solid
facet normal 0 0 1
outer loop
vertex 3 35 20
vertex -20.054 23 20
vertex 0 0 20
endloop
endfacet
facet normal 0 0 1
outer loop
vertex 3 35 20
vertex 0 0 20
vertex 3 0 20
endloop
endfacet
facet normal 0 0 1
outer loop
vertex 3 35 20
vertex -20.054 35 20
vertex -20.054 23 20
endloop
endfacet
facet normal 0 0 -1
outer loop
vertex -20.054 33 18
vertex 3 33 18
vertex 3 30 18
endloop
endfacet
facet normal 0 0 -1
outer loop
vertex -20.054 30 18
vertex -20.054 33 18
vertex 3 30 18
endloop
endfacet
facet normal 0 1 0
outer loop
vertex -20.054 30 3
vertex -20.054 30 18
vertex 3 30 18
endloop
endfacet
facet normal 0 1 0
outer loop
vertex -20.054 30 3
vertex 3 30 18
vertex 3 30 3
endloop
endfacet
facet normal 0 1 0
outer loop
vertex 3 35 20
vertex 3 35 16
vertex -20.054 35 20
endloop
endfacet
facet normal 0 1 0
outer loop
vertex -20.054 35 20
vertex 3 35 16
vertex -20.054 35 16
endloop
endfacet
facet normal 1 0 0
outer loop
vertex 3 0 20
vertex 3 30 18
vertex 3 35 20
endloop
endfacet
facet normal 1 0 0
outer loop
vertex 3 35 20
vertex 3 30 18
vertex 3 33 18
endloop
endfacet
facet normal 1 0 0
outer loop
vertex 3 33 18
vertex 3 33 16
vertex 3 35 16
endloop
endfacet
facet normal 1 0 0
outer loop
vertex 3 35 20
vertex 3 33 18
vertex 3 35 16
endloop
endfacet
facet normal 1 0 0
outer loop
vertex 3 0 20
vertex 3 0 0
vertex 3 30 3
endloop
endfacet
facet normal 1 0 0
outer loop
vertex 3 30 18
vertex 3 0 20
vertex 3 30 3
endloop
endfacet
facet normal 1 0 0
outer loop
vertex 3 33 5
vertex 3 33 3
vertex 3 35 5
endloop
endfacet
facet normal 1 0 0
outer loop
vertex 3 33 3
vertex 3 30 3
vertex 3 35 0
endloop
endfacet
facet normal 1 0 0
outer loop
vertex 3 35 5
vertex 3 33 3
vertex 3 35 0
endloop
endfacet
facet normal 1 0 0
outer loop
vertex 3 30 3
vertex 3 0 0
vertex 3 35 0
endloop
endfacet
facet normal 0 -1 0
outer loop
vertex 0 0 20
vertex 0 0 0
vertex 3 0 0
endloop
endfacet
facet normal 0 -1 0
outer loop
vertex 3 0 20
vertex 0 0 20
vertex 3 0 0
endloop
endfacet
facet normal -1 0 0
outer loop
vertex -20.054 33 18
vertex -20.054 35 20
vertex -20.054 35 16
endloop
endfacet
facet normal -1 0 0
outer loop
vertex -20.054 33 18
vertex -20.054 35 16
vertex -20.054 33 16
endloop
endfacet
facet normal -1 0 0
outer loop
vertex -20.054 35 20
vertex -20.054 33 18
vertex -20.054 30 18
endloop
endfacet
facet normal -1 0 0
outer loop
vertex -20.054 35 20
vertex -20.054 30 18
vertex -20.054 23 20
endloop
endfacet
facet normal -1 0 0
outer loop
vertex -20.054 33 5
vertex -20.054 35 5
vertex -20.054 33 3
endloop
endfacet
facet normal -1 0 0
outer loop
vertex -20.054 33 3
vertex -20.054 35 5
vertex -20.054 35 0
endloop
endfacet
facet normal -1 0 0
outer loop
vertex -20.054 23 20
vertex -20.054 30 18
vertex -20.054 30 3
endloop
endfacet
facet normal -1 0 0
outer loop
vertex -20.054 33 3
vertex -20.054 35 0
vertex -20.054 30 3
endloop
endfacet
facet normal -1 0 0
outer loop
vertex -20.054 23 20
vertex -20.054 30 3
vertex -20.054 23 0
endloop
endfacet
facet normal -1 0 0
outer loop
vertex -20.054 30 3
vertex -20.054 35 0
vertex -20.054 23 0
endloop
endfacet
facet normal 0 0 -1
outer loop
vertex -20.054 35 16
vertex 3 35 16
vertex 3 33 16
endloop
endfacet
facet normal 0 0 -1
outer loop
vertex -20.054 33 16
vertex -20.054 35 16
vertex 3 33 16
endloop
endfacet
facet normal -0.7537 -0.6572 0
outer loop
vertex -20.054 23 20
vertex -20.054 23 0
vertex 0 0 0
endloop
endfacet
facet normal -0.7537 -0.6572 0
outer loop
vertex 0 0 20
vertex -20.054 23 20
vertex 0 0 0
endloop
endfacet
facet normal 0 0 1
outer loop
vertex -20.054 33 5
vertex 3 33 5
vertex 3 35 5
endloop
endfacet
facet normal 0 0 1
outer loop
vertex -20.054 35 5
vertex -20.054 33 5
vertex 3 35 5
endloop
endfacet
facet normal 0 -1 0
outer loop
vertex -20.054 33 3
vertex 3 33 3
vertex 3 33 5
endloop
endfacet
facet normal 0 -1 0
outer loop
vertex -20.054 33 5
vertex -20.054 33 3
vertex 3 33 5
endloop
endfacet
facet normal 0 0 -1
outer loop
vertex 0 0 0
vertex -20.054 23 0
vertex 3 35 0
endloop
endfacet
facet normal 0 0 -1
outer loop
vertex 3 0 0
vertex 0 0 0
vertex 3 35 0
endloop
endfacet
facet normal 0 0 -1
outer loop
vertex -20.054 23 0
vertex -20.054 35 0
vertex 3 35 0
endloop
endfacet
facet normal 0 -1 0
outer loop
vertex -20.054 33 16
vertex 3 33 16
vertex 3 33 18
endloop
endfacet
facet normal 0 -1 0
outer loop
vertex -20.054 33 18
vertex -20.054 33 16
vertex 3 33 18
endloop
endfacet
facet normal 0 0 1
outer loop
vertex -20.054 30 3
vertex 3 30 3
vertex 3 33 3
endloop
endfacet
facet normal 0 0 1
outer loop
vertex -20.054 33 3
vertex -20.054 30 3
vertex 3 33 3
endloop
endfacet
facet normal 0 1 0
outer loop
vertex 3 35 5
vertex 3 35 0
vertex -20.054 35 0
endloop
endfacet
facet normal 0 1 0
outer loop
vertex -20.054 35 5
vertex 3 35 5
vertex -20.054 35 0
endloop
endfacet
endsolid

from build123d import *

# Parameters (mm, degrees)
BOSS_EXTRUDE1_DEPTH = 20
CUT_EXTRUDE1_DEPTH  = 24.053894737


with BuildPart() as part:
    # Sketch1 → Boss-Extrude1 (new body)
    with BuildSketch(Plane.XY):
        Polygon((-20.053894737, 23), (0, 0), (3, 0), (3, 35), (-20.053894737, 35), align=None)
    extrude(amount=BOSS_EXTRUDE1_DEPTH)

    # Sketch2 → Cut-Extrude1 (cut, through all)
    with BuildSketch(Plane(origin=(3, 0, 0), x_dir=(0, 0, -1), z_dir=(1, 0, 0))):
        Polygon((-5, 33), (-5, 35), (-16, 35), (-16, 33), (-18, 33), (-18, 30), (-3, 30), (-3, 33), align=None)
    extrude(amount=-CUT_EXTRUDE1_DEPTH, mode=Mode.SUBTRACT)


solid = part.part
